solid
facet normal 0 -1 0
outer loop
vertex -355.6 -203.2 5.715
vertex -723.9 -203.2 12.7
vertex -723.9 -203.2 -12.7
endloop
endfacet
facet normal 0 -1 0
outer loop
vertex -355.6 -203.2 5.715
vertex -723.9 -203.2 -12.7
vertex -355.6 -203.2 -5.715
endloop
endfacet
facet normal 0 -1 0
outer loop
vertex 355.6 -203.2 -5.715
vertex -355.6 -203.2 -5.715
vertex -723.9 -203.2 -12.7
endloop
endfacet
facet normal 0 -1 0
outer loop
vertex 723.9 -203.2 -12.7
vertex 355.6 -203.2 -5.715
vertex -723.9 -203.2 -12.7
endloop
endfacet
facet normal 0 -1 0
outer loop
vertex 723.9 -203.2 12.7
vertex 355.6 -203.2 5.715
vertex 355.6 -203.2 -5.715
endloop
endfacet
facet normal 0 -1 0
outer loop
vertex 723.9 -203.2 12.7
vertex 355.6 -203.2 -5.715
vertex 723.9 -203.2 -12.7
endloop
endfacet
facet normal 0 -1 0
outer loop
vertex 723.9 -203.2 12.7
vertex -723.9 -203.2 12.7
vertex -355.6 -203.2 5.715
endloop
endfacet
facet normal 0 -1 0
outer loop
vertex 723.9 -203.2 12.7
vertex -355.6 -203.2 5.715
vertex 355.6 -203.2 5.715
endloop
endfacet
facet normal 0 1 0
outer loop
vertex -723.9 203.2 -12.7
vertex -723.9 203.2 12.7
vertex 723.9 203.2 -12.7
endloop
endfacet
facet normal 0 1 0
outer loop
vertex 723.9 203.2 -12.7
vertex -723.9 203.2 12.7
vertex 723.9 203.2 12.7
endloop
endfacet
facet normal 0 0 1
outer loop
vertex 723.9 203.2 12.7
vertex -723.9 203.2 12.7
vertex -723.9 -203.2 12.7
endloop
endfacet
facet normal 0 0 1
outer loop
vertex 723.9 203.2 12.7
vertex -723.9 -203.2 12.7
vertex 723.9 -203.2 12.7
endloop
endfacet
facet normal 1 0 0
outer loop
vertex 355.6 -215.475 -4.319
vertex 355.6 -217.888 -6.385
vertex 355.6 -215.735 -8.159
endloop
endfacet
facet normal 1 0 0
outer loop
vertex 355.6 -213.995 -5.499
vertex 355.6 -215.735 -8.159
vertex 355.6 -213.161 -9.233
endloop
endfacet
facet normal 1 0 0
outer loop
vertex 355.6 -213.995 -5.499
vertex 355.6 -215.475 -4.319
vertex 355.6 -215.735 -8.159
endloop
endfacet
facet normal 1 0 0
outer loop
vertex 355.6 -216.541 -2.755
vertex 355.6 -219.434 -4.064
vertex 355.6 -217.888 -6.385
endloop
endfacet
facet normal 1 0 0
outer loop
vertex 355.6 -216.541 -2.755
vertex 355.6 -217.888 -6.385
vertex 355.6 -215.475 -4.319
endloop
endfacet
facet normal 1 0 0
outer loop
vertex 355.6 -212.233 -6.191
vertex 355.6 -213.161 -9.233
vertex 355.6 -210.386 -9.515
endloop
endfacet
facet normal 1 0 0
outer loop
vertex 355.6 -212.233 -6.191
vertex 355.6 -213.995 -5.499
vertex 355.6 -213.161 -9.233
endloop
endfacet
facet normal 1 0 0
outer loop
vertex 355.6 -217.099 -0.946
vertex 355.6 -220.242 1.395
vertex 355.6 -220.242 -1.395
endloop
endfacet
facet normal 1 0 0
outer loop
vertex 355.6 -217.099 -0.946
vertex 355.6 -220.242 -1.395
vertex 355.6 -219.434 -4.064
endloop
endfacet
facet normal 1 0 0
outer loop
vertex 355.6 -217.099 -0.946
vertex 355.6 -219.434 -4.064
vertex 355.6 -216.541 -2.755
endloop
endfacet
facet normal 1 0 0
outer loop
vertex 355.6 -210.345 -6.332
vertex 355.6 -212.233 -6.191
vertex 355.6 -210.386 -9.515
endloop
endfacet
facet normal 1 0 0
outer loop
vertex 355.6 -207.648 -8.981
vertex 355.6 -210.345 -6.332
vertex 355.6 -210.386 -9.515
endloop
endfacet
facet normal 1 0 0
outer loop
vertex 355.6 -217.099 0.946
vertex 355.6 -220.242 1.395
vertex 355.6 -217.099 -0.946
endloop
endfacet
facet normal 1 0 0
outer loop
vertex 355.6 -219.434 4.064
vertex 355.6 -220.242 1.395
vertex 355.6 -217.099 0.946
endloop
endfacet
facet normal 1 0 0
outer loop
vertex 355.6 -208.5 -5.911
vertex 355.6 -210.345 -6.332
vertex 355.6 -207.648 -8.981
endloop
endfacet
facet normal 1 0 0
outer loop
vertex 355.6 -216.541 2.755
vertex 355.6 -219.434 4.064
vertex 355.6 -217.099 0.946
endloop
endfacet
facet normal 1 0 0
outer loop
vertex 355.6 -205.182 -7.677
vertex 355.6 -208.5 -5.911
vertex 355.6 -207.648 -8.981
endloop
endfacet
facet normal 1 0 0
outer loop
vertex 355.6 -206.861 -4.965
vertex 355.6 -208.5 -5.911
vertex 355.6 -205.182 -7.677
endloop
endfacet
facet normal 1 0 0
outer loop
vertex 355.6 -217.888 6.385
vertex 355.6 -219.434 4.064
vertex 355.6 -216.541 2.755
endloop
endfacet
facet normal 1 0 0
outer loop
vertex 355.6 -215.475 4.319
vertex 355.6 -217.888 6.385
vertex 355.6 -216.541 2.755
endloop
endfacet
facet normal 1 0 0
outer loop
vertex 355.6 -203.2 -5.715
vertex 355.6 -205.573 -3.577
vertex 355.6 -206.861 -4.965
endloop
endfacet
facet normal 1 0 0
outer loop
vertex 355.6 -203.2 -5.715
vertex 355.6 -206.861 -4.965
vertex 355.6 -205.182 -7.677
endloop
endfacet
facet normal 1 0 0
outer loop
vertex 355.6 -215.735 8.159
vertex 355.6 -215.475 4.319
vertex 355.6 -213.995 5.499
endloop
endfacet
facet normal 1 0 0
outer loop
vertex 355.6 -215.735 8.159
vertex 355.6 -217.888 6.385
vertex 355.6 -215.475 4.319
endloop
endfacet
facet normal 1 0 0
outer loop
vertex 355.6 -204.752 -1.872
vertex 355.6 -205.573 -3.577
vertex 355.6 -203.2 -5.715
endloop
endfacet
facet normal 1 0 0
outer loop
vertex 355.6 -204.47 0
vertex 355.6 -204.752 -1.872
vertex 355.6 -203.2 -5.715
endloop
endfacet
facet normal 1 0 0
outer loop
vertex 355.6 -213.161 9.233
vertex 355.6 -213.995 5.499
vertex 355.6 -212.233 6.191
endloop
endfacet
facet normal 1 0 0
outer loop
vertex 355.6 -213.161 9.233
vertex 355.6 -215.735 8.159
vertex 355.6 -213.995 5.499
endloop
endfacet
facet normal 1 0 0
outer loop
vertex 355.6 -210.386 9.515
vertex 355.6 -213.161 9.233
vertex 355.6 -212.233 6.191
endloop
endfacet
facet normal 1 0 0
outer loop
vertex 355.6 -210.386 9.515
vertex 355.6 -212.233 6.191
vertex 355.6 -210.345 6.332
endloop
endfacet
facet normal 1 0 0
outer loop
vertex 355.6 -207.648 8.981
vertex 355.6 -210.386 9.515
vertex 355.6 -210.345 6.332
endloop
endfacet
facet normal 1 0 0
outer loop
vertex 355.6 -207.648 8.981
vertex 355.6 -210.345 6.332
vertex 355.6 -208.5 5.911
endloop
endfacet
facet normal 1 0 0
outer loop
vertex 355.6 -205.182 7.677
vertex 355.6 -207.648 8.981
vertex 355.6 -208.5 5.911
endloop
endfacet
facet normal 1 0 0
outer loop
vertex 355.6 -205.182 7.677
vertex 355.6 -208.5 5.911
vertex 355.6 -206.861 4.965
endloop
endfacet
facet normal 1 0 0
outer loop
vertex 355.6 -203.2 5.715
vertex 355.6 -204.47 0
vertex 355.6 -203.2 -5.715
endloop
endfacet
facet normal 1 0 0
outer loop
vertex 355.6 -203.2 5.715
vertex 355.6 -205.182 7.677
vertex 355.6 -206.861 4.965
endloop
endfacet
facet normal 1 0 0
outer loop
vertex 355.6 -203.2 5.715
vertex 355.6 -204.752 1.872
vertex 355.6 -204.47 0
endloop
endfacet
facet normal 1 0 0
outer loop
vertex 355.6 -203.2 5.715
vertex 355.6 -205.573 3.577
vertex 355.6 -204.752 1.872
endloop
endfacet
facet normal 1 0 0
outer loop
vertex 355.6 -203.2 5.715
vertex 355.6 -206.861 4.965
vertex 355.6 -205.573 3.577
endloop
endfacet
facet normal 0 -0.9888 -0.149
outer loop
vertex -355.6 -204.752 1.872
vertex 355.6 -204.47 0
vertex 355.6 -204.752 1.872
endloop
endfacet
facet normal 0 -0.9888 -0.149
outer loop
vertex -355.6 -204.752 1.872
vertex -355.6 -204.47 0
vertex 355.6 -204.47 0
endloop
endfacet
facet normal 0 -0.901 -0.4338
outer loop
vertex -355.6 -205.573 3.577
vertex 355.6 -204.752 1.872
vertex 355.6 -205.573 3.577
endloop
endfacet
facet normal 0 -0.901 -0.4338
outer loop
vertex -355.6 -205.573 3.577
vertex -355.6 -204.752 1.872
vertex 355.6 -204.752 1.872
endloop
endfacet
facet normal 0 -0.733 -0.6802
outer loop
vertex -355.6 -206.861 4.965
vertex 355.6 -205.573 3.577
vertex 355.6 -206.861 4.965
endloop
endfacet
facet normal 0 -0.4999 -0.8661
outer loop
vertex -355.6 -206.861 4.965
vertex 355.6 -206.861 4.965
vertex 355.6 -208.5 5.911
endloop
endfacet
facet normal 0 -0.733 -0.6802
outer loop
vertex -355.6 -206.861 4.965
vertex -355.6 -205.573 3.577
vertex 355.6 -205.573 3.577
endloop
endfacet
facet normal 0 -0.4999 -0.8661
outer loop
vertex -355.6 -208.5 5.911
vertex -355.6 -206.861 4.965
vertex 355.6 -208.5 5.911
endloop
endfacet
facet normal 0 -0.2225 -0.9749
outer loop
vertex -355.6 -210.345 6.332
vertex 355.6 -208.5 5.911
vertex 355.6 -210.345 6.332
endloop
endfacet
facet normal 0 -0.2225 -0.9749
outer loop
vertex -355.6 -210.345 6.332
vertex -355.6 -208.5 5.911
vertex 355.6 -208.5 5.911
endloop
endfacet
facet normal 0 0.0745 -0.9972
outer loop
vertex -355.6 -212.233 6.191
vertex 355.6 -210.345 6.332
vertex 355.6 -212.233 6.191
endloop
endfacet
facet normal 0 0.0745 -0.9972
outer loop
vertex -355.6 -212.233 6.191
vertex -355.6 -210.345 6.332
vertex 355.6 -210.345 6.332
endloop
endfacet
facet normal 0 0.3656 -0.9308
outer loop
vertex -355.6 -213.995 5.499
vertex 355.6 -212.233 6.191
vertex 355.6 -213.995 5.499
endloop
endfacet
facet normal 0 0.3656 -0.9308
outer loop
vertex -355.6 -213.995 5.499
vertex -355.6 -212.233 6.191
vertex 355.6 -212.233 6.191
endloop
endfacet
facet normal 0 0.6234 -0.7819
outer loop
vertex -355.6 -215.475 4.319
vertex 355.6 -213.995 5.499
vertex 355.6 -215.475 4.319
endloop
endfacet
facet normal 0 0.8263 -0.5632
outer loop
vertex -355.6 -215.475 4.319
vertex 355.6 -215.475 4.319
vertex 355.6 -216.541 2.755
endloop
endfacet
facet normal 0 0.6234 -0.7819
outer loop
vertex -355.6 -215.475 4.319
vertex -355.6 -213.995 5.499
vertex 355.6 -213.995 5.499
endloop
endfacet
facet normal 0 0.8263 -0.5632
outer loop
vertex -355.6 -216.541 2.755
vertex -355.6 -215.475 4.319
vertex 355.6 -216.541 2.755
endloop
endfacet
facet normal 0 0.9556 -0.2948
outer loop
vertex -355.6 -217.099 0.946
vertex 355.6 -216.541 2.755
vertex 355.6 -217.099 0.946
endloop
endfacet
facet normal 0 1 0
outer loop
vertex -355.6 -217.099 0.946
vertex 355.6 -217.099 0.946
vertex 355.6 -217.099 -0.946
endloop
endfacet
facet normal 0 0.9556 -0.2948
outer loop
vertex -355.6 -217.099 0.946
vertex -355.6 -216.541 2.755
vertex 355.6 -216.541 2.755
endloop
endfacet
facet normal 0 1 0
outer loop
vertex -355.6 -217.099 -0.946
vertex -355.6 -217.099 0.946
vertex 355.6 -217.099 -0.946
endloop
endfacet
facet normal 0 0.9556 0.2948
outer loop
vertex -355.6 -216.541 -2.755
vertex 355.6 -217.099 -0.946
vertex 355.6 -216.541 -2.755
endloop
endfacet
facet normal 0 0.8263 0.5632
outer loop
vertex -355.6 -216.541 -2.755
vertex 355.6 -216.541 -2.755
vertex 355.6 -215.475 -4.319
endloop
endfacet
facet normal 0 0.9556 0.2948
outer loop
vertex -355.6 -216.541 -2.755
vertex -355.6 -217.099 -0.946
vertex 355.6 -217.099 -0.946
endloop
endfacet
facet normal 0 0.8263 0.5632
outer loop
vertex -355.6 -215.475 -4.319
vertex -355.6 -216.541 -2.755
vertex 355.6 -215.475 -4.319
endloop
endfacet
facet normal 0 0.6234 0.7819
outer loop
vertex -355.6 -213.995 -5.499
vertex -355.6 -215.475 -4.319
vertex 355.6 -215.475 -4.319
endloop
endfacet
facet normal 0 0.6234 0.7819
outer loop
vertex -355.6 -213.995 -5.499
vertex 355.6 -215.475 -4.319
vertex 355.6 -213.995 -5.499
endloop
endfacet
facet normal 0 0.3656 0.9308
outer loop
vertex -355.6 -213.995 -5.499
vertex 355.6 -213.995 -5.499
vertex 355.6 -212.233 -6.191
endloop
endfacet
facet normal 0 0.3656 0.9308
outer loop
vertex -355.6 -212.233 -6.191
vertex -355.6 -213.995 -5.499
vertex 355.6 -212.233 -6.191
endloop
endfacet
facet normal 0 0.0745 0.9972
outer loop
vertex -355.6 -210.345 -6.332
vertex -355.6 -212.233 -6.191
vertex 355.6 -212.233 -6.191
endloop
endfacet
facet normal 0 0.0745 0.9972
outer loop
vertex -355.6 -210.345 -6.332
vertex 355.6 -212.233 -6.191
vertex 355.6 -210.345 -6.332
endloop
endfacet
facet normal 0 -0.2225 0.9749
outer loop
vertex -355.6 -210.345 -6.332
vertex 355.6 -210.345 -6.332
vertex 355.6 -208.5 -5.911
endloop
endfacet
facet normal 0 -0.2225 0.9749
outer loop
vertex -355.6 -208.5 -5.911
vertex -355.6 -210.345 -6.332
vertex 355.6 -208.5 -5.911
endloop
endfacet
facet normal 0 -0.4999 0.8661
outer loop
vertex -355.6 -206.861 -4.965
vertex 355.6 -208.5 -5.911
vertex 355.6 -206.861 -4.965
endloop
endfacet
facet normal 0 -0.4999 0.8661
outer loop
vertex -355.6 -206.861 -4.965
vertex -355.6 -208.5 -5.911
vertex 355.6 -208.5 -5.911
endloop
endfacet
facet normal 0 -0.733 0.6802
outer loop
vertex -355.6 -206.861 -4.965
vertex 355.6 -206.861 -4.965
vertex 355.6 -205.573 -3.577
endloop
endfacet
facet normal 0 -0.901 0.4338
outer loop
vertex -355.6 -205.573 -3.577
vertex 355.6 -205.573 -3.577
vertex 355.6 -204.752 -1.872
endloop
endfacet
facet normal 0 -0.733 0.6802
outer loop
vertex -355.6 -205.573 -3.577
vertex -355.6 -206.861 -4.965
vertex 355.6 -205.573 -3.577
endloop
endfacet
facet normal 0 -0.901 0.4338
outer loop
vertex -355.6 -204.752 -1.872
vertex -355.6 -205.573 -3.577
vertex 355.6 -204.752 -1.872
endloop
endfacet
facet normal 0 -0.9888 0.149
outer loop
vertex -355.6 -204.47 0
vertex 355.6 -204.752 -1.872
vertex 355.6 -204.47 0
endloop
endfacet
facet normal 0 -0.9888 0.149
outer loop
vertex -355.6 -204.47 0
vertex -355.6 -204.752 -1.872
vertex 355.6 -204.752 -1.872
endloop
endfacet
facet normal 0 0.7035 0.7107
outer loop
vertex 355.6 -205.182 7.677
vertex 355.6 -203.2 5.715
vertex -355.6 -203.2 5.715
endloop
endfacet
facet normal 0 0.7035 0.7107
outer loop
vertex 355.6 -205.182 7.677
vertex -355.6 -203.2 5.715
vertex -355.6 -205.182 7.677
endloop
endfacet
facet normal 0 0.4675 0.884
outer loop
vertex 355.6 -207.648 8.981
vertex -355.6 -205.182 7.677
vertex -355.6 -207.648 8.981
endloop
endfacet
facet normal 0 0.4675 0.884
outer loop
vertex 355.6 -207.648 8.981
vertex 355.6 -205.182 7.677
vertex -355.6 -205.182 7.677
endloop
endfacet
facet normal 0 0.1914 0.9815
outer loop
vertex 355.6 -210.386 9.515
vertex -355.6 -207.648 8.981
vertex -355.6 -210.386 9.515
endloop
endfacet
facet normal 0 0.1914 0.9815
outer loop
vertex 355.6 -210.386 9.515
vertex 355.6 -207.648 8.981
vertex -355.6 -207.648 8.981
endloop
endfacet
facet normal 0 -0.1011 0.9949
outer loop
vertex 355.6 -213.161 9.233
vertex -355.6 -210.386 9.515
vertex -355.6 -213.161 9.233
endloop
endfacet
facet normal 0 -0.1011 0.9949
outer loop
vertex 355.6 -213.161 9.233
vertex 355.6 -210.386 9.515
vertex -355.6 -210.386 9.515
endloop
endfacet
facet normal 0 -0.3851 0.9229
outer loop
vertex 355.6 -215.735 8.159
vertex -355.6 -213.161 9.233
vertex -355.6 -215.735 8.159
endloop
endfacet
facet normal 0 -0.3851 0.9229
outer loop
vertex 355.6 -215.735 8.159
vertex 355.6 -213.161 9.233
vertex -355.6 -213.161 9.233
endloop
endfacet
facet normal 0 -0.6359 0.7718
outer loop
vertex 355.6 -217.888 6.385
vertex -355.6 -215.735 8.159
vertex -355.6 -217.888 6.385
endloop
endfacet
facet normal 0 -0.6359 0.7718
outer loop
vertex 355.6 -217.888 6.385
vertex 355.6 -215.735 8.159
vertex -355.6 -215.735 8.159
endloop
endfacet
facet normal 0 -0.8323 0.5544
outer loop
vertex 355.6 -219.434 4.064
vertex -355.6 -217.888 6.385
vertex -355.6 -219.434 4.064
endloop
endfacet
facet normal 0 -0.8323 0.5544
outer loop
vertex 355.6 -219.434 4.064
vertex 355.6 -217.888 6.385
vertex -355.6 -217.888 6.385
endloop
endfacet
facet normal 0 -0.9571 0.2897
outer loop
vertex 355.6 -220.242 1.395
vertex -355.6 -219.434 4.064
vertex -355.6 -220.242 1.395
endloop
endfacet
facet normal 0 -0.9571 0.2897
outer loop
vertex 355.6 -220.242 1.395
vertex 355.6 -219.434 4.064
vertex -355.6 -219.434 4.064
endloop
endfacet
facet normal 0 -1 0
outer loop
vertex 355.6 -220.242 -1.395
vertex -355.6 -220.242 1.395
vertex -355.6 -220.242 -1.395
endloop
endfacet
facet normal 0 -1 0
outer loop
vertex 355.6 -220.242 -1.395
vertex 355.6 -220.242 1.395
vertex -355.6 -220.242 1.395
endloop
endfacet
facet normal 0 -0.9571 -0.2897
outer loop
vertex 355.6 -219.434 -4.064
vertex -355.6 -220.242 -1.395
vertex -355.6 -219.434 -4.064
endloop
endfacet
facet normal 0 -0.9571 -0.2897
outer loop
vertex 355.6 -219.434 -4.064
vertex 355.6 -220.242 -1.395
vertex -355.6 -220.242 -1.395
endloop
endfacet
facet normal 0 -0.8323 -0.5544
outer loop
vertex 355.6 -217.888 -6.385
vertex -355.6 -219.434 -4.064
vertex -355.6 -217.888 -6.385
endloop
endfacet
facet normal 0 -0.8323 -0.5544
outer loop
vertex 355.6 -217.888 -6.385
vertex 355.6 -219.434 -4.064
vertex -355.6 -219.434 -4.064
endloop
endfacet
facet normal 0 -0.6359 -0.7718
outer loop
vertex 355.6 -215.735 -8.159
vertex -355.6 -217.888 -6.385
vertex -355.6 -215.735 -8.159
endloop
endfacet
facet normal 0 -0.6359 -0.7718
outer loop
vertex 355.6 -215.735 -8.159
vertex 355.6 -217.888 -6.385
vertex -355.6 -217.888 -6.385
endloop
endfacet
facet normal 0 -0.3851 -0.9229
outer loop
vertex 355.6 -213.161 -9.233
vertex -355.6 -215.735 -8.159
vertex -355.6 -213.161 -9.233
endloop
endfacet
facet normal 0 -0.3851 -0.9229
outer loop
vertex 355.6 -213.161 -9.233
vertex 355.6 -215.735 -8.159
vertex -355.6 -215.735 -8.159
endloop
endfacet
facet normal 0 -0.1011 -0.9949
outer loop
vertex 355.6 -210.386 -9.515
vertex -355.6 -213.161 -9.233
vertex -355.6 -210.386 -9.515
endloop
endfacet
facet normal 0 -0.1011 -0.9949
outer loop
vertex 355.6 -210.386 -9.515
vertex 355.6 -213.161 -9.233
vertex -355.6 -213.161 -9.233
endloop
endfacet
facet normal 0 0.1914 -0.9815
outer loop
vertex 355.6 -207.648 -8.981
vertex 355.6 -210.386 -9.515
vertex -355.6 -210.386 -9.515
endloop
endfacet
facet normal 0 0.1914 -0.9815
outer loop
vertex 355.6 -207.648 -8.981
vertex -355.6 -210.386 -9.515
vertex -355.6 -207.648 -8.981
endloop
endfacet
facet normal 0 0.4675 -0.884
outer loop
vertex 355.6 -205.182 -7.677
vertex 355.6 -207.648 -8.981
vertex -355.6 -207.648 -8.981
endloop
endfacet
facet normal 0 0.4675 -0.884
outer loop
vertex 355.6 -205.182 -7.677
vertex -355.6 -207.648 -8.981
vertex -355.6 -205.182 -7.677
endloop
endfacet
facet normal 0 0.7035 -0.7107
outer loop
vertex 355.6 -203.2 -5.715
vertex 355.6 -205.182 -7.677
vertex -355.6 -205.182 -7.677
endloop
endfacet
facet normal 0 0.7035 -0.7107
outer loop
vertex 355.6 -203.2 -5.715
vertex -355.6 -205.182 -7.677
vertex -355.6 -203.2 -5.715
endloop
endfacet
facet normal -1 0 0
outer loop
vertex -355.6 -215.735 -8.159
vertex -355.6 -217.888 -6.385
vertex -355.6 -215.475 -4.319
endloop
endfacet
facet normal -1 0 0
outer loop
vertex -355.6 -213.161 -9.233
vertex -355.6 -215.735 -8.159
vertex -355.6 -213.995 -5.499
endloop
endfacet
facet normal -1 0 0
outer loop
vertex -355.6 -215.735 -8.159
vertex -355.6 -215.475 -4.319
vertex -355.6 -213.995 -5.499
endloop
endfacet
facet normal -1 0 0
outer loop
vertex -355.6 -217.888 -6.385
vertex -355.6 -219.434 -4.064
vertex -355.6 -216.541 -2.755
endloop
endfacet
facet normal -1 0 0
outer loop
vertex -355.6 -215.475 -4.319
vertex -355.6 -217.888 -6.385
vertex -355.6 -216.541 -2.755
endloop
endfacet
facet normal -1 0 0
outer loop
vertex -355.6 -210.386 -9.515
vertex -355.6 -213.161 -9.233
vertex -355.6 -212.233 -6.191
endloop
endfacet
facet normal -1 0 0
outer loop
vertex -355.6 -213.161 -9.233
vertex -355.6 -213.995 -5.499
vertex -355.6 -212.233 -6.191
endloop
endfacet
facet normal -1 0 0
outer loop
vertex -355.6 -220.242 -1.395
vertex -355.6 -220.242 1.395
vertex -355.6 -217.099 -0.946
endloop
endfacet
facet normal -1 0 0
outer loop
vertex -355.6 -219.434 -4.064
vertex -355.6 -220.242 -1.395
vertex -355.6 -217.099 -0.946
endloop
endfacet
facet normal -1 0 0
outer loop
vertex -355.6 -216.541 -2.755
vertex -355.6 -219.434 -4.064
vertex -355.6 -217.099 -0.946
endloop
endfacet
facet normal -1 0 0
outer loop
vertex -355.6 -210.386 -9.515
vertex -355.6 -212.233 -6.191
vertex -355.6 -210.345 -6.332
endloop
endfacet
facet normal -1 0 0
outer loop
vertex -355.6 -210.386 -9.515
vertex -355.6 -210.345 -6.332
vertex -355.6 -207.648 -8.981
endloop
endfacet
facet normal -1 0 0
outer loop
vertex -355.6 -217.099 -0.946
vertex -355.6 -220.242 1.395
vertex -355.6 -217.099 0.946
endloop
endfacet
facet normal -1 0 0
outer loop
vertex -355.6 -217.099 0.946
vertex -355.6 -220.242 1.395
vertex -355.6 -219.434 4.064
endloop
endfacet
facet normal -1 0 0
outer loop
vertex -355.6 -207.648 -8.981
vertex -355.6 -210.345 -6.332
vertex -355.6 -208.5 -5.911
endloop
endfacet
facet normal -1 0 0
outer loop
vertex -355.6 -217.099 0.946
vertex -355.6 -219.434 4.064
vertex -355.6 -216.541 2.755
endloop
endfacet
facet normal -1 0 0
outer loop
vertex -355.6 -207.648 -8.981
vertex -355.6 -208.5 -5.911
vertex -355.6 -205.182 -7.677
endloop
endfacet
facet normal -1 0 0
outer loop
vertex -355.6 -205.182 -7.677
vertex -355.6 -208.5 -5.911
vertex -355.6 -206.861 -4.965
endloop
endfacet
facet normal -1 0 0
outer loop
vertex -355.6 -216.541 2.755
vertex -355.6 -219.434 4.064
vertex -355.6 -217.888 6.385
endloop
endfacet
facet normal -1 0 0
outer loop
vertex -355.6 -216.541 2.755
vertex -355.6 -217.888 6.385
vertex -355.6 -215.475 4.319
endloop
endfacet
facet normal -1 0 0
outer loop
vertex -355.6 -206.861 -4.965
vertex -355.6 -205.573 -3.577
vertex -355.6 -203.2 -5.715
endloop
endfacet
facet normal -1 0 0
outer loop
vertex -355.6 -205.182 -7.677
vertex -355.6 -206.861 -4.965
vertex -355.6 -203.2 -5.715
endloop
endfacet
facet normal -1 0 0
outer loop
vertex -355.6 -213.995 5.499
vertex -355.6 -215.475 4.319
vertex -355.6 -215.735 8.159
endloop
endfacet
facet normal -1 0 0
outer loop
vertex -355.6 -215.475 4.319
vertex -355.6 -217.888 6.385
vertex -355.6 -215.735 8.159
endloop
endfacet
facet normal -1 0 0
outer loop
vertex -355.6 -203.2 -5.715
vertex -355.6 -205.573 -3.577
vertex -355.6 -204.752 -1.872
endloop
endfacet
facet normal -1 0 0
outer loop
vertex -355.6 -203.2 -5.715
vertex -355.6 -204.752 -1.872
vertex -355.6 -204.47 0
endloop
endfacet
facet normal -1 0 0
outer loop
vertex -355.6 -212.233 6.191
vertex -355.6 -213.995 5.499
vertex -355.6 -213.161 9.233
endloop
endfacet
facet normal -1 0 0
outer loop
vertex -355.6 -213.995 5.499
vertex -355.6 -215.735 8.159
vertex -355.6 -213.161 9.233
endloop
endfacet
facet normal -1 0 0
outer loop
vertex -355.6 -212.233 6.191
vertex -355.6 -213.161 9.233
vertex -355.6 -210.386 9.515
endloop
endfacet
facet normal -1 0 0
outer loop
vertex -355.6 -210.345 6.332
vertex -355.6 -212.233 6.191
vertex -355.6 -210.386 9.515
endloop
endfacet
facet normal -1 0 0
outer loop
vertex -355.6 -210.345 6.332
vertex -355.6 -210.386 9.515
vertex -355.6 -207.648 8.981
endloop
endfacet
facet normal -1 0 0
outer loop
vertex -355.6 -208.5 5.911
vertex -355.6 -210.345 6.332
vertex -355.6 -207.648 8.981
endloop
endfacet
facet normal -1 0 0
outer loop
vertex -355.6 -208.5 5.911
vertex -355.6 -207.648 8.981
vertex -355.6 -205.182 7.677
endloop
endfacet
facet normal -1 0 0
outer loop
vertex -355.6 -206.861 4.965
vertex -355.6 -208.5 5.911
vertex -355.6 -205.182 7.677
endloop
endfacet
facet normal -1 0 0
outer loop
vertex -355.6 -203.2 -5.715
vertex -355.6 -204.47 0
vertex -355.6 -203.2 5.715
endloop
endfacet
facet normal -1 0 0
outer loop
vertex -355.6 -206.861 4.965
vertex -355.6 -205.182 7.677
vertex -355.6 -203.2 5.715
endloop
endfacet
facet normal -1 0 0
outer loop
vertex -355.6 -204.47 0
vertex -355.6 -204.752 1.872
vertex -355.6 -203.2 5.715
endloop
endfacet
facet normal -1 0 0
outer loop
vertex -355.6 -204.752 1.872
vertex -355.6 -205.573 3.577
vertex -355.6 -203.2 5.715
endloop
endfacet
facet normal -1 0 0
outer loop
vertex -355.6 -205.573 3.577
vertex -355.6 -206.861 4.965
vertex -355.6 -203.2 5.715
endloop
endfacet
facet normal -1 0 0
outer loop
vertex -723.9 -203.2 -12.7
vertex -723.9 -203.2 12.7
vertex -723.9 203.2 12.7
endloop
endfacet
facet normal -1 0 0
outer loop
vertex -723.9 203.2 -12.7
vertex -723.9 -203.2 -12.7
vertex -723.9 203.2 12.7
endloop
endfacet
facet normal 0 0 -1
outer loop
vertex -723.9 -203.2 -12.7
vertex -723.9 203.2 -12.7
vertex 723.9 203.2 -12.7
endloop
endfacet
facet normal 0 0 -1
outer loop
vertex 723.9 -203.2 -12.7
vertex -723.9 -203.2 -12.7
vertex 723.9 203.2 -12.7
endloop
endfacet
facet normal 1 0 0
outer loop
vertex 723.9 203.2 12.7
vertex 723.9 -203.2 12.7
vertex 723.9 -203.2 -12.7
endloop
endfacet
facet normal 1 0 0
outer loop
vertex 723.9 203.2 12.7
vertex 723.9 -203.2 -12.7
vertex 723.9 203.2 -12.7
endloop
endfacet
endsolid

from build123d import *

# Parameters (mm, degrees)
F0_W     = 1447.8
F0_H     = 406.4
F2_DEPTH = 12.7
F1_R     = 9.525
F1_R_2   = 6.35
F3_DEPTH = 355.6


with BuildPart() as f2:
    # F0 (on Top) → F2 (new body, symmetric)
    with BuildSketch(Plane.XY):
        Rectangle(F0_W, F0_H)
    extrude(amount=F2_DEPTH, both=True)

    # F1 (on Right) → F3 (join, symmetric)
    with BuildSketch(Plane.YZ):
        with Locations((-210.82, 0)):
            Circle(F1_R)
        with Locations((-210.82, 0)):
            Circle(F1_R_2, mode=Mode.SUBTRACT)
    extrude(amount=F3_DEPTH, both=True)


solid = f2.part
